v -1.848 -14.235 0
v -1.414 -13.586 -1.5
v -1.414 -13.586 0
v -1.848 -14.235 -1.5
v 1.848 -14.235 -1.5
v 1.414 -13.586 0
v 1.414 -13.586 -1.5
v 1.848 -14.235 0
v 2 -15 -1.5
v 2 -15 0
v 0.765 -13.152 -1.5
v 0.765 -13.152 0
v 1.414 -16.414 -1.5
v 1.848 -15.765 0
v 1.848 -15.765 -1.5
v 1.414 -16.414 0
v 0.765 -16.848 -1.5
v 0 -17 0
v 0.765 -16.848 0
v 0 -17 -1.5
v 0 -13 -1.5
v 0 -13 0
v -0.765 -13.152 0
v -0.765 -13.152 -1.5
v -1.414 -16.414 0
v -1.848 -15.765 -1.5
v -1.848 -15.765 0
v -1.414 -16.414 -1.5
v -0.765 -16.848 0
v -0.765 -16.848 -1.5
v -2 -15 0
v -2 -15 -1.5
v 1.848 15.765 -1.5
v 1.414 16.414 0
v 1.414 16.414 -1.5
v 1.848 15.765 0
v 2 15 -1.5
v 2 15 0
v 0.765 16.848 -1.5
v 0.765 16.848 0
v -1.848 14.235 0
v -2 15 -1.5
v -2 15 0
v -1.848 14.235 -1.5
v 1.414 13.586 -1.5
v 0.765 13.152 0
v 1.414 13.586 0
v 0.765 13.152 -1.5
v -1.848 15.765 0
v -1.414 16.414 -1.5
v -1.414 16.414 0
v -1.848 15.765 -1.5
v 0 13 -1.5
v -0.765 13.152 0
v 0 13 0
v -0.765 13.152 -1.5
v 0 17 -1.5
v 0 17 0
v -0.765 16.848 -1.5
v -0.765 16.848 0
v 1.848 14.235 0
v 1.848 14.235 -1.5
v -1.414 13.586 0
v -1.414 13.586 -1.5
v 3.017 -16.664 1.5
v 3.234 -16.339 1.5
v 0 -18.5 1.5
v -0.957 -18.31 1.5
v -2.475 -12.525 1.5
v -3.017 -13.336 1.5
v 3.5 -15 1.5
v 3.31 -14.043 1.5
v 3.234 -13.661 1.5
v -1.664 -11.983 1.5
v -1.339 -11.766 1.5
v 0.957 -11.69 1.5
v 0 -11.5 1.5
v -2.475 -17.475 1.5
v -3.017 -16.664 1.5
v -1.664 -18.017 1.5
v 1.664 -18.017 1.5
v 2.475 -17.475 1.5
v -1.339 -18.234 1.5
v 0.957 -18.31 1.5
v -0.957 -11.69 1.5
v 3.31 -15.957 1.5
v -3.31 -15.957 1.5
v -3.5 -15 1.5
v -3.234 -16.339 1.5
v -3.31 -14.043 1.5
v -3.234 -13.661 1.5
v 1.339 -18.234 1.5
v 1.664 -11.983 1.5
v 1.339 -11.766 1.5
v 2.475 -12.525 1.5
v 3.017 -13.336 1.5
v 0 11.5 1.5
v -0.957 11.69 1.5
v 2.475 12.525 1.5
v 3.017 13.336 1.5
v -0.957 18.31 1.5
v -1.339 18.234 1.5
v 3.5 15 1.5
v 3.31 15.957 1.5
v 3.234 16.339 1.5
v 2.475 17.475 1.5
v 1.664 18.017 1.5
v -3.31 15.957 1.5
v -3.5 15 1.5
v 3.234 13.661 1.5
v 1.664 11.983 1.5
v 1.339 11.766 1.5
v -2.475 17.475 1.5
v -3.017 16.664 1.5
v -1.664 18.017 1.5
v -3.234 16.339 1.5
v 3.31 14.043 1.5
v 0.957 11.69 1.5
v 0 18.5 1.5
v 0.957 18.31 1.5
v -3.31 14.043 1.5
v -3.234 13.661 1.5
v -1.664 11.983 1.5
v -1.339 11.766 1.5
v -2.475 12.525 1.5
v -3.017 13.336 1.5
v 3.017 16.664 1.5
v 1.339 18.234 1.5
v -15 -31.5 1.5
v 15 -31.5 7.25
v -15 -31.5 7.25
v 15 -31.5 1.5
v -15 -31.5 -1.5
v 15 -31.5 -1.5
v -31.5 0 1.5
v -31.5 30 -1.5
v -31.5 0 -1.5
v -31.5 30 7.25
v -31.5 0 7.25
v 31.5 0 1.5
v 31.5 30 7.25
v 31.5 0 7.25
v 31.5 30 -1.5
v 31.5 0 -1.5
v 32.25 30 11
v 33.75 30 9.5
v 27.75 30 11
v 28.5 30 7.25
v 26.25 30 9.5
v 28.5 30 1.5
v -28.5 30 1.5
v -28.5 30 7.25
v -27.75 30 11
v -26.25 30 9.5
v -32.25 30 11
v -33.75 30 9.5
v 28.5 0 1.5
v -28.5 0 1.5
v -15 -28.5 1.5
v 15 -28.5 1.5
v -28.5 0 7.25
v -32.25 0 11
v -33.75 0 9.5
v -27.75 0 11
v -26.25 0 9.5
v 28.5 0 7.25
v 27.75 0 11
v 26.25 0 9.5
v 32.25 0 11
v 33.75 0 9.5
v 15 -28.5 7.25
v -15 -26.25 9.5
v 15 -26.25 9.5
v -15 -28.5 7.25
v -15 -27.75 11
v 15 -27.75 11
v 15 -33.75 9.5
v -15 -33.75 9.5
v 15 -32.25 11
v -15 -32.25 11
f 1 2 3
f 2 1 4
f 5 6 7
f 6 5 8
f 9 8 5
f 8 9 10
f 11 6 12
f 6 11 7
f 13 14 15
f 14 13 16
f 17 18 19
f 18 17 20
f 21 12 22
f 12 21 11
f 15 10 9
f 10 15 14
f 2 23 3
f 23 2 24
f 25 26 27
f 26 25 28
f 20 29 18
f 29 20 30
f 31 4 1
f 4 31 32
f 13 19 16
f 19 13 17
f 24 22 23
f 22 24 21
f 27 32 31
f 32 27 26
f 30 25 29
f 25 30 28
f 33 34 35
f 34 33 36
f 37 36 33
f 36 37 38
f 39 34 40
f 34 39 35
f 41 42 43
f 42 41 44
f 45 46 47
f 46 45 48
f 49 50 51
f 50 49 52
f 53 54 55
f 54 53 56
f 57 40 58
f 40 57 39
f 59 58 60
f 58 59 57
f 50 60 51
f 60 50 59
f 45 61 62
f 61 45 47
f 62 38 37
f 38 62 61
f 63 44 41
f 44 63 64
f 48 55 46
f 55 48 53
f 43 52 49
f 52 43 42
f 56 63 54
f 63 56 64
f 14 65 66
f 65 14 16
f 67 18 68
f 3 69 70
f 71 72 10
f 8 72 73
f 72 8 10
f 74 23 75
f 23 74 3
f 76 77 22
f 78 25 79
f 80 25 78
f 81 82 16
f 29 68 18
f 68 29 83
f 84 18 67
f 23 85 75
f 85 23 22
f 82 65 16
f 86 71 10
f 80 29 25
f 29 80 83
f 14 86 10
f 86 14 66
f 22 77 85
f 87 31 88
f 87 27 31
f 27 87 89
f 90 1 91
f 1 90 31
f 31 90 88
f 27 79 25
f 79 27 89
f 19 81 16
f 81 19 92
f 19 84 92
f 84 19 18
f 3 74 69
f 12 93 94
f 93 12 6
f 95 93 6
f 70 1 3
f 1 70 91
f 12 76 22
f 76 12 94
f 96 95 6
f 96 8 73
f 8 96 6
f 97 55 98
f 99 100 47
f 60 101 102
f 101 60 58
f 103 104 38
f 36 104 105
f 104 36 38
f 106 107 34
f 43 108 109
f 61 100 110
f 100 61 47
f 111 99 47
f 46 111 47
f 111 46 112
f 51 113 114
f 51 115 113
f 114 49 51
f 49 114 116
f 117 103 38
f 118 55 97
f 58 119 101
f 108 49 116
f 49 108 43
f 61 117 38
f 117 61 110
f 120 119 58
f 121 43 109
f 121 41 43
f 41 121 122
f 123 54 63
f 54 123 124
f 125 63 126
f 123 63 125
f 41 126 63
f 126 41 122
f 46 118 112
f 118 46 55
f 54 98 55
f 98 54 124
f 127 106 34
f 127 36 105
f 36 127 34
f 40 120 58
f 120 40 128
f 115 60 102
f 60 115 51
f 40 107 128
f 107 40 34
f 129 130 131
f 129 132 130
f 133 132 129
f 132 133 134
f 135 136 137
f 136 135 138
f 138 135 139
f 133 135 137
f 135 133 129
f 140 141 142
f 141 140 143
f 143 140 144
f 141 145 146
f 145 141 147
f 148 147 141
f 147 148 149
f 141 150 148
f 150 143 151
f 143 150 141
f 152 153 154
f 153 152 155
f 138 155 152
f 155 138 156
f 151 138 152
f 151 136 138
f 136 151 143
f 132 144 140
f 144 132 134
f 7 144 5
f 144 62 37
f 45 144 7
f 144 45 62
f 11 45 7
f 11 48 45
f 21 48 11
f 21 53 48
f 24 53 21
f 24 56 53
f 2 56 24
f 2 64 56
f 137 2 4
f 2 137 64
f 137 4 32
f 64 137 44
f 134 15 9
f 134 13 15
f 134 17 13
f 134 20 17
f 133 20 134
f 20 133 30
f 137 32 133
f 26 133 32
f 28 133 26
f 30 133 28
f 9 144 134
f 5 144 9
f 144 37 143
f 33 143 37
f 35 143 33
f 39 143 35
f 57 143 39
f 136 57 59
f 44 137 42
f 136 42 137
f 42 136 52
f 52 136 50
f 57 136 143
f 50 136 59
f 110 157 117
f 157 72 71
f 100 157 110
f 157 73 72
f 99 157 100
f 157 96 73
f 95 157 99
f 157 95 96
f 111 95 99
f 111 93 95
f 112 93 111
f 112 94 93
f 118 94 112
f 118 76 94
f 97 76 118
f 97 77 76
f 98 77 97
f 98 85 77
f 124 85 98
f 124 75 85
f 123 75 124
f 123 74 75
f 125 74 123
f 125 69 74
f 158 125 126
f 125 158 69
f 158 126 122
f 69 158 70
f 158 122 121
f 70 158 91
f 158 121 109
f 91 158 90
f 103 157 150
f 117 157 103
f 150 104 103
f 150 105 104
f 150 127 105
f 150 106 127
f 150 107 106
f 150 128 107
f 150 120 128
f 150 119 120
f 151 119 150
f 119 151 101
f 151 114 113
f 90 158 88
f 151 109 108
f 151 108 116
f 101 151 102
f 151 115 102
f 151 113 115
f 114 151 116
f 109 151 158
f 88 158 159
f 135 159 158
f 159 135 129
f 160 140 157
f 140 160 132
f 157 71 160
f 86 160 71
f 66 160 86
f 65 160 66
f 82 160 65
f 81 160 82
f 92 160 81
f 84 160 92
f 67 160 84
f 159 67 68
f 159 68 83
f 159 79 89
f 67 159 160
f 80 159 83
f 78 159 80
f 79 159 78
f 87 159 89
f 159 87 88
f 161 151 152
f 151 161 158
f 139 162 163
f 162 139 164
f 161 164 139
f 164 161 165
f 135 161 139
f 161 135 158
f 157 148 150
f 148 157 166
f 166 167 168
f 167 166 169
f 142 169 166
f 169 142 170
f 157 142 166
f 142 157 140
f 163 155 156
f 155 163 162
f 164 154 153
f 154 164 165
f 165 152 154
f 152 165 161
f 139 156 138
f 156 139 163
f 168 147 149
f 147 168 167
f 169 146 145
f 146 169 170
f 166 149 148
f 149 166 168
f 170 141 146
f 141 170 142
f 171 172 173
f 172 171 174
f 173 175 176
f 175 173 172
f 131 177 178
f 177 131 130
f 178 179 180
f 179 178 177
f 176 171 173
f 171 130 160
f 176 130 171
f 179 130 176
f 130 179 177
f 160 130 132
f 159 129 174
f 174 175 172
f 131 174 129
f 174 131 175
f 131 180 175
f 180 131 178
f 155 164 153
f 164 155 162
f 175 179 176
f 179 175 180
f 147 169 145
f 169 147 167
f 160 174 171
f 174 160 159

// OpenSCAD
l = 60;
b = 60;
h = 8;
t = 3;
s = 4;

difference()
{
hull()
{
for ( a = [ -1, +1 ] )
	tx( l/2*a ) ty( b/4 )
		cbox( t, b/2, t );

	ty( -b/2 )
		cbox( l/2, t, t );
}

for ( a = [ -1, +1 ] )
	ty( a * l/4 )
		ccyl( d = s, h = 100, $fn = 16 );

for ( a = [ -1, +1 ] )
	ty( a * l/4 ) tz( t/2 )
		ccyl( d1 = s, d2 = s+t*2, h = t, $fn = 16 );
}


for ( a = [ -1, +1 ] )
	tx( l/2*a ) tz( h / 2 ) ty( b/4 )
		cbox( t, b/2, t+h );

	ty( -b/2 ) tz( h / 2 )
		cbox( l/2, t, t+h );

	

intersection()
{
union()
{
for ( a = [ -1, +1 ] )
	tx( l/2*a ) tz( h + t / 2 ) ty( b/4 )
		rx( 90 )
			ccyl( d = t*2.5, h = b/2, $fn = 4 );

	ty( -b/2 ) tz( h + t / 2 )
		ry( 90 )
			ccyl( d = t*2.5, h = l/2, $fn = 4 );
}

cbox( l*2, b*2, h*2 + t*2 );
}


/// lazy.scad 1.1
/// a collection of useful macros for the lazy OpenSCAD programmer
/// http://www.thingiverse.com/thing:512443

// single axis translations
module tx( x ) translate( [ x, 0, 0 ] ) for(c=[0:$children-1])child(c);
module ty( y ) translate( [ 0, y, 0 ] ) for(c=[0:$children-1])child(c);
module tz( z ) translate( [ 0, 0, z ] ) for(c=[0:$children-1])child(c);

// 2d translations
module txy( x, y ) translate( [ x, y, 0 ] ) for(c=[0:$children-1])child(c);
module tyz( y, z ) translate( [ 0, y, z ] ) for(c=[0:$children-1])child(c);
module txz( x, z ) translate( [ x, 0, z ] ) for(c=[0:$children-1])child(c);

// 3d translation
module txyz( x, y, z ) translate( [ x, y, z ] ) for(c=[0:$children-1])child(c);

// single axis rotations
module rx( a ) rotate( [ a, 0, 0 ] ) for(c=[0:$children-1])child(c);
module ry( a ) rotate( [ 0, a, 0 ] ) for(c=[0:$children-1])child(c);
module rz( a ) rotate( [ 0, 0, a ] ) for(c=[0:$children-1])child(c);

// centered box (cube)
module cbox( x, y, z ) cube( [ x, y, z ], center = true );

// centered cylinder
module ccyl( d, h, d1, d2, r, r1, r2 )
 cylinder( h = h, r = ( d == undef ? r : d/2 ), r1 = ( d1 == undef ? r1 : d1/2 ), r2 = ( d2 == undef ? r2 : d2 / 2 ), center = true );

/// end lazy.scad
